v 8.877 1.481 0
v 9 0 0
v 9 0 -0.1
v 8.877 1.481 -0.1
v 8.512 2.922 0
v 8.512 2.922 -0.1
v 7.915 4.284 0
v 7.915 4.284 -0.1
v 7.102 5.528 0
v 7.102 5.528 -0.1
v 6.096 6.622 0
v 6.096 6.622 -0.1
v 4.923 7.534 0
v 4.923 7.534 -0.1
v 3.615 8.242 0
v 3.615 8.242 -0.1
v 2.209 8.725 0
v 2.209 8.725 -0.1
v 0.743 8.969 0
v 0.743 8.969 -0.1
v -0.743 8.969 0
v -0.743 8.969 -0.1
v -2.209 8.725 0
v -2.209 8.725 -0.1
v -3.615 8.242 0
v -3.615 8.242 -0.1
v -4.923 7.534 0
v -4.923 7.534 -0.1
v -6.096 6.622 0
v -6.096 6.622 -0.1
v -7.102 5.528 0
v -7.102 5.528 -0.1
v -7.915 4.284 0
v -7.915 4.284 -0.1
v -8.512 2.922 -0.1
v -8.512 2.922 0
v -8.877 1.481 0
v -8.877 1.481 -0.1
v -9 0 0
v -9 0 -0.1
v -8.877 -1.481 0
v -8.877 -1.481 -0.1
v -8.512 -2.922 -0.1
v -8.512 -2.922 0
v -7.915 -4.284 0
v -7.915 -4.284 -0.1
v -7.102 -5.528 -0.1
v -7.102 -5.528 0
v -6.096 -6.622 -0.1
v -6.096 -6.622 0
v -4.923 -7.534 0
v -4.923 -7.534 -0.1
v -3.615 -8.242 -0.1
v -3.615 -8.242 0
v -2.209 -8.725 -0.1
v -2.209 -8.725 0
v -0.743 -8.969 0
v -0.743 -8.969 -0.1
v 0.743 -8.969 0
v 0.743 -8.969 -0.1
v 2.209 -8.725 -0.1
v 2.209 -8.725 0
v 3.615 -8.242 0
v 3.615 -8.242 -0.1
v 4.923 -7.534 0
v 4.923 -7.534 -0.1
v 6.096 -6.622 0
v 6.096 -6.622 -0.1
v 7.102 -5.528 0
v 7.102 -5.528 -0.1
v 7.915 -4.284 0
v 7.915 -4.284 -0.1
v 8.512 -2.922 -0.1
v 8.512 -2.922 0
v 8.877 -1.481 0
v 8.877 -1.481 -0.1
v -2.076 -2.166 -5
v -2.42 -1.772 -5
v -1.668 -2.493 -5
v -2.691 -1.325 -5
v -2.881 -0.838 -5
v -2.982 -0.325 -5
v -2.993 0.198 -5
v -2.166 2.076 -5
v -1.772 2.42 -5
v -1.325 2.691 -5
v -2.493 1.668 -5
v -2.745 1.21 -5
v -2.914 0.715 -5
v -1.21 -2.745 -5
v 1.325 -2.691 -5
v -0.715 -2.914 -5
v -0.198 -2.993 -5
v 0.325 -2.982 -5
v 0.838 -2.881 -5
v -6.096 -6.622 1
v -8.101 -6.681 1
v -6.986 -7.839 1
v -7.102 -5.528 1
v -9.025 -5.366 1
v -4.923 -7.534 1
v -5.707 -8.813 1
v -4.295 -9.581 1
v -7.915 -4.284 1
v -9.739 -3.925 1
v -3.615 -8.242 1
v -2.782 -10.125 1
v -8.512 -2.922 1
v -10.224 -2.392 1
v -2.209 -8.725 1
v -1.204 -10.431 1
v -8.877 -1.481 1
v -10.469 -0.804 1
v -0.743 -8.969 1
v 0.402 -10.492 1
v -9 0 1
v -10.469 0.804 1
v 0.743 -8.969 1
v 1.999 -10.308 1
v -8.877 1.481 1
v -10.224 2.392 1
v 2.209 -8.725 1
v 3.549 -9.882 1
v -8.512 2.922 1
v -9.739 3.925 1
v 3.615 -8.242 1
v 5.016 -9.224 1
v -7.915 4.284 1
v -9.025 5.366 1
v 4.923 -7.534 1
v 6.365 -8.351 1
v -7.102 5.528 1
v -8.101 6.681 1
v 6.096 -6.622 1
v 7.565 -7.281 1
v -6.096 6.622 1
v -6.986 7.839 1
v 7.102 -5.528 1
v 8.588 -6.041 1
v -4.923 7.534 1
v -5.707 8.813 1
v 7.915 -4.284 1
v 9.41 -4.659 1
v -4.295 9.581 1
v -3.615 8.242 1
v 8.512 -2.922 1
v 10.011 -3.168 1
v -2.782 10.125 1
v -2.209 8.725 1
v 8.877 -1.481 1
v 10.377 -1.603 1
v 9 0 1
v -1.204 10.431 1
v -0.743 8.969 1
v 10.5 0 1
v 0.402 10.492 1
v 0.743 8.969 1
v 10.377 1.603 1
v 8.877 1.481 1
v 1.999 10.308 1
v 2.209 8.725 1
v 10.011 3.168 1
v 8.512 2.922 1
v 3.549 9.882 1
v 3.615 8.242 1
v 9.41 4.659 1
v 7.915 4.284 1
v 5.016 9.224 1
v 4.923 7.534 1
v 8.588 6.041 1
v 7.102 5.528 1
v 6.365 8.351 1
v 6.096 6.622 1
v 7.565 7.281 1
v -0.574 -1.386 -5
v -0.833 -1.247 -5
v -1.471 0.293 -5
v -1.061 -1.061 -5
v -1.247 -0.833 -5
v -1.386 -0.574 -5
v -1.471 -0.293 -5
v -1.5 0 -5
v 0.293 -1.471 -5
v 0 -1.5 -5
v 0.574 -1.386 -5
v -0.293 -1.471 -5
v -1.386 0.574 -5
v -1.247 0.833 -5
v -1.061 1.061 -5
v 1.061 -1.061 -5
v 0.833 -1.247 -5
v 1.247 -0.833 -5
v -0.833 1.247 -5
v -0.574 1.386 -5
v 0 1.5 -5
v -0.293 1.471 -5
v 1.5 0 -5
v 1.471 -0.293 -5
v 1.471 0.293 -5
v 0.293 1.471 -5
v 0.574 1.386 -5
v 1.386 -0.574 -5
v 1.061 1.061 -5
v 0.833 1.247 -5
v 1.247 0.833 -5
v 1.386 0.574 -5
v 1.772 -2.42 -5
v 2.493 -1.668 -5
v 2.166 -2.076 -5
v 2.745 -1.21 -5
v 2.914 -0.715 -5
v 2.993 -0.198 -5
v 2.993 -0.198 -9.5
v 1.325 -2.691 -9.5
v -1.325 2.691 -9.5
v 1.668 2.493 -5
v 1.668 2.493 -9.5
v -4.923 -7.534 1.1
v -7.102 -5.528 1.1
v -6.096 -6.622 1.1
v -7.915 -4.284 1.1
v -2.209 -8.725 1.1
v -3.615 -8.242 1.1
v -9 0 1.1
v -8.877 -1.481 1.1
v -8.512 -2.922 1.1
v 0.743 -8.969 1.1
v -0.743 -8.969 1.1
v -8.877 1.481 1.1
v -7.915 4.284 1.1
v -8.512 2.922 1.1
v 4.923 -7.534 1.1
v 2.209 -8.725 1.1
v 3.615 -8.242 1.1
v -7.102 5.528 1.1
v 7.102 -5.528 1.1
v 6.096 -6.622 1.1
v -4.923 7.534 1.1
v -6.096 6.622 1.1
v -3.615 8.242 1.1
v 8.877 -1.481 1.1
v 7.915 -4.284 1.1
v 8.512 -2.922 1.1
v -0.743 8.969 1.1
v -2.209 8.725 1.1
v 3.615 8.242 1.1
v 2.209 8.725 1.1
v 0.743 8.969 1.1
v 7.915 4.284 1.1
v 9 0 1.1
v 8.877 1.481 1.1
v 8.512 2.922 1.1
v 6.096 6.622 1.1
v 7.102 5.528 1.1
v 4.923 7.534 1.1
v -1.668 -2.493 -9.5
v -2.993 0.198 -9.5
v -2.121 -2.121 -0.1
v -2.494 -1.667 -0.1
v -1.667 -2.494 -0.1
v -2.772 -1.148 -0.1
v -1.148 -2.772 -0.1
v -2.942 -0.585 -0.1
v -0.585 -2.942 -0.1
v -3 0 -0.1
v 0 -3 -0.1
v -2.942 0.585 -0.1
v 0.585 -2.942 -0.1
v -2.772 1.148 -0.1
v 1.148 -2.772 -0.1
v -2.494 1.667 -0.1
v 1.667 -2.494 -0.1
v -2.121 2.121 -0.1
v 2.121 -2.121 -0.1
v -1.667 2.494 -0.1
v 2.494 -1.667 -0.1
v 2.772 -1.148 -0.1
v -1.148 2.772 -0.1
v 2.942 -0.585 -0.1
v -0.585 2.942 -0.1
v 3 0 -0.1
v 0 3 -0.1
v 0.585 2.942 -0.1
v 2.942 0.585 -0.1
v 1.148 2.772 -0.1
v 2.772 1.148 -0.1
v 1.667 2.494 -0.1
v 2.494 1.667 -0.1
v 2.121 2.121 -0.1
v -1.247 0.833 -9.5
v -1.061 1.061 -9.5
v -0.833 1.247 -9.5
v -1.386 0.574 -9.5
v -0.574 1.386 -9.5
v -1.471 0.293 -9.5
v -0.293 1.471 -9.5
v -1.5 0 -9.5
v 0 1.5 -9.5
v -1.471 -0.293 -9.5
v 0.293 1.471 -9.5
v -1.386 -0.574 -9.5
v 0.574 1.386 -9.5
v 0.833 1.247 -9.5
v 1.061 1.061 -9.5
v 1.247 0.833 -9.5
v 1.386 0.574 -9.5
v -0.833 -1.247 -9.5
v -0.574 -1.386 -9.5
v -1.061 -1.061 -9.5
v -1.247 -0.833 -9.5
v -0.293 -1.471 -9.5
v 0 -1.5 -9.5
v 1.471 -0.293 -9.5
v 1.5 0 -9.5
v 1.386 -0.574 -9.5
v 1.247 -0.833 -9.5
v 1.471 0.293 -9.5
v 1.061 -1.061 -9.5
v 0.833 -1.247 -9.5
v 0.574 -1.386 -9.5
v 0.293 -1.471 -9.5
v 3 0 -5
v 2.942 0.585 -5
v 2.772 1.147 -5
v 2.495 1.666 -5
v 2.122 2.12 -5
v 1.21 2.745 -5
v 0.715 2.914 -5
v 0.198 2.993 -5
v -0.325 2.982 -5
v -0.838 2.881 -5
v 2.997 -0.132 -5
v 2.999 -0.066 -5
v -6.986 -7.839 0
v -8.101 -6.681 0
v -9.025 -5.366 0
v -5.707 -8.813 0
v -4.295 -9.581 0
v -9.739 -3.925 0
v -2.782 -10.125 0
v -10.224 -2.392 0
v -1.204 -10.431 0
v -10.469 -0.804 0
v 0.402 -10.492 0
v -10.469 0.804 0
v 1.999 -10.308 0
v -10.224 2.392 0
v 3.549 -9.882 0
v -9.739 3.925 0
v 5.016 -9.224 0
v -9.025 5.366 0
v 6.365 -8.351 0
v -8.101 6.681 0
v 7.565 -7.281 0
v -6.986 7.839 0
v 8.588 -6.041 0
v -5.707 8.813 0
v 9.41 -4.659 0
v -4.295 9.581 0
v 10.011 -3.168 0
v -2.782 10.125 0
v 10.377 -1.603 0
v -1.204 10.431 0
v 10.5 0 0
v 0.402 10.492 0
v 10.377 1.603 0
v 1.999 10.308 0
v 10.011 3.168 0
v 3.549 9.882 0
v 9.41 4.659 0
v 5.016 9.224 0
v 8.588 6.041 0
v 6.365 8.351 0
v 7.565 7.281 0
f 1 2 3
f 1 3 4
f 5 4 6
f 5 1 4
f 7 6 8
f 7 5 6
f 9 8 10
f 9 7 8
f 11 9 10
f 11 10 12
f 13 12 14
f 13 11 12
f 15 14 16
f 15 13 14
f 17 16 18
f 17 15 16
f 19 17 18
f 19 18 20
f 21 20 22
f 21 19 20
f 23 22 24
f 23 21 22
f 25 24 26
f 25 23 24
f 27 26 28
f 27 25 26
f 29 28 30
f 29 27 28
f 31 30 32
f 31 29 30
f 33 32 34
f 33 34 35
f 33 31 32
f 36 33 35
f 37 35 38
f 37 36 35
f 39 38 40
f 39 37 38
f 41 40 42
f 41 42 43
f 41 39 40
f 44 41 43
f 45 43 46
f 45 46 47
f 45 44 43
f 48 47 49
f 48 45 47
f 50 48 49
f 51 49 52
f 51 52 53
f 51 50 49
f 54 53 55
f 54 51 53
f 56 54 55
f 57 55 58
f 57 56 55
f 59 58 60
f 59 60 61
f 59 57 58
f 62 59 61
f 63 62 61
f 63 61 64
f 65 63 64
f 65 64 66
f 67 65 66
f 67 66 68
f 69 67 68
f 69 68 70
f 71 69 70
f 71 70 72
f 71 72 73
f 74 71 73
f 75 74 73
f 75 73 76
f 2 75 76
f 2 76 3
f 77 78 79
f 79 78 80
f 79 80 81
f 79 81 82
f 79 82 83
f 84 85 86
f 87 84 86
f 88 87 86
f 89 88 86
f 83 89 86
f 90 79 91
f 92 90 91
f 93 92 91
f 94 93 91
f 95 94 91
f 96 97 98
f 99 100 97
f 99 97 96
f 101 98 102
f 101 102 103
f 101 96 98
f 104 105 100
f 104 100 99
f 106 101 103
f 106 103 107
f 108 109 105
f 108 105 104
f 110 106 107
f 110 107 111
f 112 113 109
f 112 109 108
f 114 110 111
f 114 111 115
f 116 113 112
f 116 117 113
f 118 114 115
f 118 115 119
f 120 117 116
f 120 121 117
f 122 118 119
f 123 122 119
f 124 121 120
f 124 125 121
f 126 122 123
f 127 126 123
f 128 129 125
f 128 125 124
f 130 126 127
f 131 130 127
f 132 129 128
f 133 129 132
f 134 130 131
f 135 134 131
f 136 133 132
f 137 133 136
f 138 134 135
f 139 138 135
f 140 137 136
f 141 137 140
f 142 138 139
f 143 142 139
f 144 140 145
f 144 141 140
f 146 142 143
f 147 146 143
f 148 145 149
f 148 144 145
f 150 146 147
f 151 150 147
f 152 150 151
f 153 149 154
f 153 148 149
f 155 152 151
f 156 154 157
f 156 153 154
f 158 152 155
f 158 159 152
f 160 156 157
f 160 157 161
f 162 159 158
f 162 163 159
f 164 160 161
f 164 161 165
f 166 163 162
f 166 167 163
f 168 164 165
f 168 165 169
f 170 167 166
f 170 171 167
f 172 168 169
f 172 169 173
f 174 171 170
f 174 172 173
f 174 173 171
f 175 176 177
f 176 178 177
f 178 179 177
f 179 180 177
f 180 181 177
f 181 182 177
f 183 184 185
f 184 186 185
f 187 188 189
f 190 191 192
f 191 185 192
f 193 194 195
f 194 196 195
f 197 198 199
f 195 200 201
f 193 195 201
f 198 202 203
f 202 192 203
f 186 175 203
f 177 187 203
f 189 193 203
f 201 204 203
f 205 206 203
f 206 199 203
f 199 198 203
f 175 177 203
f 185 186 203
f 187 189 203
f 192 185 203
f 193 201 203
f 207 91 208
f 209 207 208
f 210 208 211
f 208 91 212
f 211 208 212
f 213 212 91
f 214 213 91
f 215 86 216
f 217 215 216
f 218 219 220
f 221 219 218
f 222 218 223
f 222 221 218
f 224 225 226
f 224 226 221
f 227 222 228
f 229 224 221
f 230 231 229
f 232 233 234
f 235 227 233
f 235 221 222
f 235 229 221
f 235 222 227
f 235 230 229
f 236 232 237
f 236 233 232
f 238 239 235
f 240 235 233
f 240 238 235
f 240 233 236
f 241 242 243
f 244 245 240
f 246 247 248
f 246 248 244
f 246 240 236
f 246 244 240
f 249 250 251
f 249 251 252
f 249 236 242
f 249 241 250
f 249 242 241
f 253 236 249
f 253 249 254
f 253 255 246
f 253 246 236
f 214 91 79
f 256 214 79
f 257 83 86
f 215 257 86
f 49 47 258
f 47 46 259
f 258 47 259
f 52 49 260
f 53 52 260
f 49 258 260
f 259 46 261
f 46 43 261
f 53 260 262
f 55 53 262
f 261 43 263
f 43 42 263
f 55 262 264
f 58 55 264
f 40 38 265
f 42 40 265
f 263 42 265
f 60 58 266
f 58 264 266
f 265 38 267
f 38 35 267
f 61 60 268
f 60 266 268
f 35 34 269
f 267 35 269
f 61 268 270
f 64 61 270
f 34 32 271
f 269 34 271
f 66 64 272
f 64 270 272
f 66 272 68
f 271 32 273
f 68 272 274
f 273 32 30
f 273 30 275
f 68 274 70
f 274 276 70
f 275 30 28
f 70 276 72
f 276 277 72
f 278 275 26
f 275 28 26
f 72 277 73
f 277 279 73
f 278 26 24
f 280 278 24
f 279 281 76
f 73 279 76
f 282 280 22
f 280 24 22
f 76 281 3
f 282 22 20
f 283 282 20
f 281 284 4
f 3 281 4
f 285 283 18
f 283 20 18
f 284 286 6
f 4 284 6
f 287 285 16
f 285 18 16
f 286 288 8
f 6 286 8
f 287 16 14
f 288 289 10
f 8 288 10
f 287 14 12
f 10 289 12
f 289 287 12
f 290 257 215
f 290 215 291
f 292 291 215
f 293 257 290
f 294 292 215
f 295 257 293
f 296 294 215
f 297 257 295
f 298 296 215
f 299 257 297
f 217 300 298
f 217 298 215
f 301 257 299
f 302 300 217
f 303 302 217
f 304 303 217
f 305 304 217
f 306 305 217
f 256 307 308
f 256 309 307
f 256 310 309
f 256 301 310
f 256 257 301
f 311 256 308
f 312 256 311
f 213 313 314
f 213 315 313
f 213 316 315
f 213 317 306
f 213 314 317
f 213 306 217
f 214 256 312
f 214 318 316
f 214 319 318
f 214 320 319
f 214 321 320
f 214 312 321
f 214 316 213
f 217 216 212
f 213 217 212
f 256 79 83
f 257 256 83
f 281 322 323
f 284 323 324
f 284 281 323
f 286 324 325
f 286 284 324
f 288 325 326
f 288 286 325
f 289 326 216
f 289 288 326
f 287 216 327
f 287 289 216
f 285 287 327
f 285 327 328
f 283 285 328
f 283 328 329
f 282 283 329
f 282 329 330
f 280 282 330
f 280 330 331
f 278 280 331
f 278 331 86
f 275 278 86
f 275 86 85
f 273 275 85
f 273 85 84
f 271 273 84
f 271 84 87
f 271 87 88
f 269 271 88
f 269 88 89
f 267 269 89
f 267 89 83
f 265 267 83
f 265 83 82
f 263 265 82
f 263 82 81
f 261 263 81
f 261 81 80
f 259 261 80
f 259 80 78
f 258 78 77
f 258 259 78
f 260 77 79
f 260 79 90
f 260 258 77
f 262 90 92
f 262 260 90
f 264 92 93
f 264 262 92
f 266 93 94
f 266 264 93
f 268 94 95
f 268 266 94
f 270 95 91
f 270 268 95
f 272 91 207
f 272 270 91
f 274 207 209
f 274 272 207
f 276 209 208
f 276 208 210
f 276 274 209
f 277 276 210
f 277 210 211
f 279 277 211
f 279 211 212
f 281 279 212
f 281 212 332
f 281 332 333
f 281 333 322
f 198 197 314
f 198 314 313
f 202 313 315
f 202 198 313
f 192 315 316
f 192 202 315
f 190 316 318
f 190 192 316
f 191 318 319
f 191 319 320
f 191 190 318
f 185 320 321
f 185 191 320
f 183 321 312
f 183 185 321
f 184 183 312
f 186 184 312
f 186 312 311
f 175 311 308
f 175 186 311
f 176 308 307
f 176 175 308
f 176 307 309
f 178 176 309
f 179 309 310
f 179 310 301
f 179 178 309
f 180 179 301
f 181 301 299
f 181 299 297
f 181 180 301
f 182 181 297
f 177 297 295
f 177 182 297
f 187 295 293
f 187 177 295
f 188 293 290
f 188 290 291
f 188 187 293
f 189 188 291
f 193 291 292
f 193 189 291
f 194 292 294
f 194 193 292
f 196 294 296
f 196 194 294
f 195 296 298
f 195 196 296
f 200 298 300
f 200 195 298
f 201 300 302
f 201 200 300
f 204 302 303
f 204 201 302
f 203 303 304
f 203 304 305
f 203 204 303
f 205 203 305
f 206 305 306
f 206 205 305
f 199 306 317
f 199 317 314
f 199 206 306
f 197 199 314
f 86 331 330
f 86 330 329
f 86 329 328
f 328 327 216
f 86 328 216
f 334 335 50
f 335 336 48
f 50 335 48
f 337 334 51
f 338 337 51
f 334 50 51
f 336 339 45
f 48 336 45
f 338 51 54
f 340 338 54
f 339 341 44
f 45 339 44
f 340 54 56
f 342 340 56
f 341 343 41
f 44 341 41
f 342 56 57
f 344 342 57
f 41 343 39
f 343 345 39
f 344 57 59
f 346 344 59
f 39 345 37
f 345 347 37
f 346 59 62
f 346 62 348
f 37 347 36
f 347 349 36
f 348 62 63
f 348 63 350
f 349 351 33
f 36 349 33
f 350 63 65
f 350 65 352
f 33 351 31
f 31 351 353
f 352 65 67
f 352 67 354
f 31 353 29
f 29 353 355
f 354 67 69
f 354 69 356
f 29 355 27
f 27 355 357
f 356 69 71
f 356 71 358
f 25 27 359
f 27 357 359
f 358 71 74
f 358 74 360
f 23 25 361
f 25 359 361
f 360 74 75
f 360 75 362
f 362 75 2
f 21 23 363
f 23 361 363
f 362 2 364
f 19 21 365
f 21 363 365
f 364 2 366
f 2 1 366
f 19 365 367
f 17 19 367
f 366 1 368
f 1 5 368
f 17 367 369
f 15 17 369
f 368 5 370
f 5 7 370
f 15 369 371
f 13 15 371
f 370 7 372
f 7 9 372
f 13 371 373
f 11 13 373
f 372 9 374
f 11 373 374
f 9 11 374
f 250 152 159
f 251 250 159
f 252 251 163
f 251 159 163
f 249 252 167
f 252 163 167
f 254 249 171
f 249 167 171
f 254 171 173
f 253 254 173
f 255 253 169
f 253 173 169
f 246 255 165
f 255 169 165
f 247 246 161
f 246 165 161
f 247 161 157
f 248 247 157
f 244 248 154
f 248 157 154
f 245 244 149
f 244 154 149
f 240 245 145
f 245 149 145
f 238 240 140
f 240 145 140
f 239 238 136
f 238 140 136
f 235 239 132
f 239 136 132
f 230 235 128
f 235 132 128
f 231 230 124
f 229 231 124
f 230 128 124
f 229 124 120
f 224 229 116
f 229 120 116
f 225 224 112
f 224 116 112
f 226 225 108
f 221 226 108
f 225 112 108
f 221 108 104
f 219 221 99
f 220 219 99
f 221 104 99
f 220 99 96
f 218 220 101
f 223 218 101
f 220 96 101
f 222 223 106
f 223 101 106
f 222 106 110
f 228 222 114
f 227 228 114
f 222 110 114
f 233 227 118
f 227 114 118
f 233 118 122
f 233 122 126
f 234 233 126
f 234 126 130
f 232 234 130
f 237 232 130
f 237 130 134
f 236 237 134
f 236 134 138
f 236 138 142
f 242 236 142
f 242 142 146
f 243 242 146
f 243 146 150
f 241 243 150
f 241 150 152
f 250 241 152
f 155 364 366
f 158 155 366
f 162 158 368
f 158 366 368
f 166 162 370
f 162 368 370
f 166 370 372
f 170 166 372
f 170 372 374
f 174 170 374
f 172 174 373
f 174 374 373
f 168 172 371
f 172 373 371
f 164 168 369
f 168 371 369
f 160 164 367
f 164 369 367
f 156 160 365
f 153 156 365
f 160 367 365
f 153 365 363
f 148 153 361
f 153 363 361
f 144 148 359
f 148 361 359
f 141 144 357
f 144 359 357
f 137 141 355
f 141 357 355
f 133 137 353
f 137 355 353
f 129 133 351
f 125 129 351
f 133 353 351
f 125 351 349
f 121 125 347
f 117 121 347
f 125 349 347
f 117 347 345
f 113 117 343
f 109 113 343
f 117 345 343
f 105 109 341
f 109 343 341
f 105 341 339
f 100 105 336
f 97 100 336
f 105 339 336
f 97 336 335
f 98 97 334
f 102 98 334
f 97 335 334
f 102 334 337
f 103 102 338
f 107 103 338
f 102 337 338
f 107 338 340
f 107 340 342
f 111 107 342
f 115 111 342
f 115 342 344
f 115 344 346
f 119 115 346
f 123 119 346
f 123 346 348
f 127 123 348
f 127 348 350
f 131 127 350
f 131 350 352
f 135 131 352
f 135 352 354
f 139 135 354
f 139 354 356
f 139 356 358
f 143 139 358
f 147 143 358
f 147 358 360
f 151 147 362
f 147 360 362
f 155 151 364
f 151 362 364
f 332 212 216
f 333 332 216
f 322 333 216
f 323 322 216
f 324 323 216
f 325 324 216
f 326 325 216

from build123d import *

# Parameters (mm, degrees)
F0_R     = 10.5
F0_R_2   = 9
F0_R_3   = 3
F1_DEPTH = 1
F2_DEPTH = 5
F3_DEPTH = 0.1
F4_DEPTH = 0.1
F5_R     = 9
F6_DEPTH = 0.1
F7_R     = 1.5
F8_DEPTH = 4.5


with BuildPart() as f1:
    # F0 (on Top) → F1 (new body)
    with BuildSketch(Plane.XY):
        Circle(F0_R)
        Circle(F0_R_2, mode=Mode.SUBTRACT)
        Circle(F0_R_2)
        Circle(F0_R_3, mode=Mode.SUBTRACT)
        Circle(F0_R_3)
    extrude(amount=F1_DEPTH)

    # F0 (on Top) → F2 (join)
    with BuildSketch(Plane.XY):
        Circle(F0_R_3)
    extrude(amount=-F2_DEPTH)

    # F0 (on Top) → F3 (join)
    with BuildSketch(Plane.XY):
        Circle(F0_R_2)
        Circle(F0_R_3, mode=Mode.SUBTRACT)
    extrude(amount=F3_DEPTH)

    # F0 (on Top) → F4 (join)
    with BuildSketch(Plane.XY):
        Circle(F0_R_2)
        Circle(F0_R_3, mode=Mode.SUBTRACT)
    extrude(amount=-F4_DEPTH)

    # F5 (on face) → F6 (join)
    with BuildSketch(Plane.XY.offset(1)):
        Circle(F5_R)
    extrude(amount=F6_DEPTH)

    # F7 (on face) → F8 (join)
    with BuildSketch(Plane(origin=(0, 0, -5), x_dir=(1, 0, 0), z_dir=(0, 0, -1))):
        Polygon((1.668331337, -2.4933251994), (2.9934486311, 0.1981547201), (1.325117294, 2.6914799195), (-1.668331337, 2.4933251994), (-2.9934486311, -0.1981547201), (-1.325117294, -2.6914799195), align=None)
        Circle(F7_R, mode=Mode.SUBTRACT)
    extrude(amount=F8_DEPTH)


solid = f1.part
